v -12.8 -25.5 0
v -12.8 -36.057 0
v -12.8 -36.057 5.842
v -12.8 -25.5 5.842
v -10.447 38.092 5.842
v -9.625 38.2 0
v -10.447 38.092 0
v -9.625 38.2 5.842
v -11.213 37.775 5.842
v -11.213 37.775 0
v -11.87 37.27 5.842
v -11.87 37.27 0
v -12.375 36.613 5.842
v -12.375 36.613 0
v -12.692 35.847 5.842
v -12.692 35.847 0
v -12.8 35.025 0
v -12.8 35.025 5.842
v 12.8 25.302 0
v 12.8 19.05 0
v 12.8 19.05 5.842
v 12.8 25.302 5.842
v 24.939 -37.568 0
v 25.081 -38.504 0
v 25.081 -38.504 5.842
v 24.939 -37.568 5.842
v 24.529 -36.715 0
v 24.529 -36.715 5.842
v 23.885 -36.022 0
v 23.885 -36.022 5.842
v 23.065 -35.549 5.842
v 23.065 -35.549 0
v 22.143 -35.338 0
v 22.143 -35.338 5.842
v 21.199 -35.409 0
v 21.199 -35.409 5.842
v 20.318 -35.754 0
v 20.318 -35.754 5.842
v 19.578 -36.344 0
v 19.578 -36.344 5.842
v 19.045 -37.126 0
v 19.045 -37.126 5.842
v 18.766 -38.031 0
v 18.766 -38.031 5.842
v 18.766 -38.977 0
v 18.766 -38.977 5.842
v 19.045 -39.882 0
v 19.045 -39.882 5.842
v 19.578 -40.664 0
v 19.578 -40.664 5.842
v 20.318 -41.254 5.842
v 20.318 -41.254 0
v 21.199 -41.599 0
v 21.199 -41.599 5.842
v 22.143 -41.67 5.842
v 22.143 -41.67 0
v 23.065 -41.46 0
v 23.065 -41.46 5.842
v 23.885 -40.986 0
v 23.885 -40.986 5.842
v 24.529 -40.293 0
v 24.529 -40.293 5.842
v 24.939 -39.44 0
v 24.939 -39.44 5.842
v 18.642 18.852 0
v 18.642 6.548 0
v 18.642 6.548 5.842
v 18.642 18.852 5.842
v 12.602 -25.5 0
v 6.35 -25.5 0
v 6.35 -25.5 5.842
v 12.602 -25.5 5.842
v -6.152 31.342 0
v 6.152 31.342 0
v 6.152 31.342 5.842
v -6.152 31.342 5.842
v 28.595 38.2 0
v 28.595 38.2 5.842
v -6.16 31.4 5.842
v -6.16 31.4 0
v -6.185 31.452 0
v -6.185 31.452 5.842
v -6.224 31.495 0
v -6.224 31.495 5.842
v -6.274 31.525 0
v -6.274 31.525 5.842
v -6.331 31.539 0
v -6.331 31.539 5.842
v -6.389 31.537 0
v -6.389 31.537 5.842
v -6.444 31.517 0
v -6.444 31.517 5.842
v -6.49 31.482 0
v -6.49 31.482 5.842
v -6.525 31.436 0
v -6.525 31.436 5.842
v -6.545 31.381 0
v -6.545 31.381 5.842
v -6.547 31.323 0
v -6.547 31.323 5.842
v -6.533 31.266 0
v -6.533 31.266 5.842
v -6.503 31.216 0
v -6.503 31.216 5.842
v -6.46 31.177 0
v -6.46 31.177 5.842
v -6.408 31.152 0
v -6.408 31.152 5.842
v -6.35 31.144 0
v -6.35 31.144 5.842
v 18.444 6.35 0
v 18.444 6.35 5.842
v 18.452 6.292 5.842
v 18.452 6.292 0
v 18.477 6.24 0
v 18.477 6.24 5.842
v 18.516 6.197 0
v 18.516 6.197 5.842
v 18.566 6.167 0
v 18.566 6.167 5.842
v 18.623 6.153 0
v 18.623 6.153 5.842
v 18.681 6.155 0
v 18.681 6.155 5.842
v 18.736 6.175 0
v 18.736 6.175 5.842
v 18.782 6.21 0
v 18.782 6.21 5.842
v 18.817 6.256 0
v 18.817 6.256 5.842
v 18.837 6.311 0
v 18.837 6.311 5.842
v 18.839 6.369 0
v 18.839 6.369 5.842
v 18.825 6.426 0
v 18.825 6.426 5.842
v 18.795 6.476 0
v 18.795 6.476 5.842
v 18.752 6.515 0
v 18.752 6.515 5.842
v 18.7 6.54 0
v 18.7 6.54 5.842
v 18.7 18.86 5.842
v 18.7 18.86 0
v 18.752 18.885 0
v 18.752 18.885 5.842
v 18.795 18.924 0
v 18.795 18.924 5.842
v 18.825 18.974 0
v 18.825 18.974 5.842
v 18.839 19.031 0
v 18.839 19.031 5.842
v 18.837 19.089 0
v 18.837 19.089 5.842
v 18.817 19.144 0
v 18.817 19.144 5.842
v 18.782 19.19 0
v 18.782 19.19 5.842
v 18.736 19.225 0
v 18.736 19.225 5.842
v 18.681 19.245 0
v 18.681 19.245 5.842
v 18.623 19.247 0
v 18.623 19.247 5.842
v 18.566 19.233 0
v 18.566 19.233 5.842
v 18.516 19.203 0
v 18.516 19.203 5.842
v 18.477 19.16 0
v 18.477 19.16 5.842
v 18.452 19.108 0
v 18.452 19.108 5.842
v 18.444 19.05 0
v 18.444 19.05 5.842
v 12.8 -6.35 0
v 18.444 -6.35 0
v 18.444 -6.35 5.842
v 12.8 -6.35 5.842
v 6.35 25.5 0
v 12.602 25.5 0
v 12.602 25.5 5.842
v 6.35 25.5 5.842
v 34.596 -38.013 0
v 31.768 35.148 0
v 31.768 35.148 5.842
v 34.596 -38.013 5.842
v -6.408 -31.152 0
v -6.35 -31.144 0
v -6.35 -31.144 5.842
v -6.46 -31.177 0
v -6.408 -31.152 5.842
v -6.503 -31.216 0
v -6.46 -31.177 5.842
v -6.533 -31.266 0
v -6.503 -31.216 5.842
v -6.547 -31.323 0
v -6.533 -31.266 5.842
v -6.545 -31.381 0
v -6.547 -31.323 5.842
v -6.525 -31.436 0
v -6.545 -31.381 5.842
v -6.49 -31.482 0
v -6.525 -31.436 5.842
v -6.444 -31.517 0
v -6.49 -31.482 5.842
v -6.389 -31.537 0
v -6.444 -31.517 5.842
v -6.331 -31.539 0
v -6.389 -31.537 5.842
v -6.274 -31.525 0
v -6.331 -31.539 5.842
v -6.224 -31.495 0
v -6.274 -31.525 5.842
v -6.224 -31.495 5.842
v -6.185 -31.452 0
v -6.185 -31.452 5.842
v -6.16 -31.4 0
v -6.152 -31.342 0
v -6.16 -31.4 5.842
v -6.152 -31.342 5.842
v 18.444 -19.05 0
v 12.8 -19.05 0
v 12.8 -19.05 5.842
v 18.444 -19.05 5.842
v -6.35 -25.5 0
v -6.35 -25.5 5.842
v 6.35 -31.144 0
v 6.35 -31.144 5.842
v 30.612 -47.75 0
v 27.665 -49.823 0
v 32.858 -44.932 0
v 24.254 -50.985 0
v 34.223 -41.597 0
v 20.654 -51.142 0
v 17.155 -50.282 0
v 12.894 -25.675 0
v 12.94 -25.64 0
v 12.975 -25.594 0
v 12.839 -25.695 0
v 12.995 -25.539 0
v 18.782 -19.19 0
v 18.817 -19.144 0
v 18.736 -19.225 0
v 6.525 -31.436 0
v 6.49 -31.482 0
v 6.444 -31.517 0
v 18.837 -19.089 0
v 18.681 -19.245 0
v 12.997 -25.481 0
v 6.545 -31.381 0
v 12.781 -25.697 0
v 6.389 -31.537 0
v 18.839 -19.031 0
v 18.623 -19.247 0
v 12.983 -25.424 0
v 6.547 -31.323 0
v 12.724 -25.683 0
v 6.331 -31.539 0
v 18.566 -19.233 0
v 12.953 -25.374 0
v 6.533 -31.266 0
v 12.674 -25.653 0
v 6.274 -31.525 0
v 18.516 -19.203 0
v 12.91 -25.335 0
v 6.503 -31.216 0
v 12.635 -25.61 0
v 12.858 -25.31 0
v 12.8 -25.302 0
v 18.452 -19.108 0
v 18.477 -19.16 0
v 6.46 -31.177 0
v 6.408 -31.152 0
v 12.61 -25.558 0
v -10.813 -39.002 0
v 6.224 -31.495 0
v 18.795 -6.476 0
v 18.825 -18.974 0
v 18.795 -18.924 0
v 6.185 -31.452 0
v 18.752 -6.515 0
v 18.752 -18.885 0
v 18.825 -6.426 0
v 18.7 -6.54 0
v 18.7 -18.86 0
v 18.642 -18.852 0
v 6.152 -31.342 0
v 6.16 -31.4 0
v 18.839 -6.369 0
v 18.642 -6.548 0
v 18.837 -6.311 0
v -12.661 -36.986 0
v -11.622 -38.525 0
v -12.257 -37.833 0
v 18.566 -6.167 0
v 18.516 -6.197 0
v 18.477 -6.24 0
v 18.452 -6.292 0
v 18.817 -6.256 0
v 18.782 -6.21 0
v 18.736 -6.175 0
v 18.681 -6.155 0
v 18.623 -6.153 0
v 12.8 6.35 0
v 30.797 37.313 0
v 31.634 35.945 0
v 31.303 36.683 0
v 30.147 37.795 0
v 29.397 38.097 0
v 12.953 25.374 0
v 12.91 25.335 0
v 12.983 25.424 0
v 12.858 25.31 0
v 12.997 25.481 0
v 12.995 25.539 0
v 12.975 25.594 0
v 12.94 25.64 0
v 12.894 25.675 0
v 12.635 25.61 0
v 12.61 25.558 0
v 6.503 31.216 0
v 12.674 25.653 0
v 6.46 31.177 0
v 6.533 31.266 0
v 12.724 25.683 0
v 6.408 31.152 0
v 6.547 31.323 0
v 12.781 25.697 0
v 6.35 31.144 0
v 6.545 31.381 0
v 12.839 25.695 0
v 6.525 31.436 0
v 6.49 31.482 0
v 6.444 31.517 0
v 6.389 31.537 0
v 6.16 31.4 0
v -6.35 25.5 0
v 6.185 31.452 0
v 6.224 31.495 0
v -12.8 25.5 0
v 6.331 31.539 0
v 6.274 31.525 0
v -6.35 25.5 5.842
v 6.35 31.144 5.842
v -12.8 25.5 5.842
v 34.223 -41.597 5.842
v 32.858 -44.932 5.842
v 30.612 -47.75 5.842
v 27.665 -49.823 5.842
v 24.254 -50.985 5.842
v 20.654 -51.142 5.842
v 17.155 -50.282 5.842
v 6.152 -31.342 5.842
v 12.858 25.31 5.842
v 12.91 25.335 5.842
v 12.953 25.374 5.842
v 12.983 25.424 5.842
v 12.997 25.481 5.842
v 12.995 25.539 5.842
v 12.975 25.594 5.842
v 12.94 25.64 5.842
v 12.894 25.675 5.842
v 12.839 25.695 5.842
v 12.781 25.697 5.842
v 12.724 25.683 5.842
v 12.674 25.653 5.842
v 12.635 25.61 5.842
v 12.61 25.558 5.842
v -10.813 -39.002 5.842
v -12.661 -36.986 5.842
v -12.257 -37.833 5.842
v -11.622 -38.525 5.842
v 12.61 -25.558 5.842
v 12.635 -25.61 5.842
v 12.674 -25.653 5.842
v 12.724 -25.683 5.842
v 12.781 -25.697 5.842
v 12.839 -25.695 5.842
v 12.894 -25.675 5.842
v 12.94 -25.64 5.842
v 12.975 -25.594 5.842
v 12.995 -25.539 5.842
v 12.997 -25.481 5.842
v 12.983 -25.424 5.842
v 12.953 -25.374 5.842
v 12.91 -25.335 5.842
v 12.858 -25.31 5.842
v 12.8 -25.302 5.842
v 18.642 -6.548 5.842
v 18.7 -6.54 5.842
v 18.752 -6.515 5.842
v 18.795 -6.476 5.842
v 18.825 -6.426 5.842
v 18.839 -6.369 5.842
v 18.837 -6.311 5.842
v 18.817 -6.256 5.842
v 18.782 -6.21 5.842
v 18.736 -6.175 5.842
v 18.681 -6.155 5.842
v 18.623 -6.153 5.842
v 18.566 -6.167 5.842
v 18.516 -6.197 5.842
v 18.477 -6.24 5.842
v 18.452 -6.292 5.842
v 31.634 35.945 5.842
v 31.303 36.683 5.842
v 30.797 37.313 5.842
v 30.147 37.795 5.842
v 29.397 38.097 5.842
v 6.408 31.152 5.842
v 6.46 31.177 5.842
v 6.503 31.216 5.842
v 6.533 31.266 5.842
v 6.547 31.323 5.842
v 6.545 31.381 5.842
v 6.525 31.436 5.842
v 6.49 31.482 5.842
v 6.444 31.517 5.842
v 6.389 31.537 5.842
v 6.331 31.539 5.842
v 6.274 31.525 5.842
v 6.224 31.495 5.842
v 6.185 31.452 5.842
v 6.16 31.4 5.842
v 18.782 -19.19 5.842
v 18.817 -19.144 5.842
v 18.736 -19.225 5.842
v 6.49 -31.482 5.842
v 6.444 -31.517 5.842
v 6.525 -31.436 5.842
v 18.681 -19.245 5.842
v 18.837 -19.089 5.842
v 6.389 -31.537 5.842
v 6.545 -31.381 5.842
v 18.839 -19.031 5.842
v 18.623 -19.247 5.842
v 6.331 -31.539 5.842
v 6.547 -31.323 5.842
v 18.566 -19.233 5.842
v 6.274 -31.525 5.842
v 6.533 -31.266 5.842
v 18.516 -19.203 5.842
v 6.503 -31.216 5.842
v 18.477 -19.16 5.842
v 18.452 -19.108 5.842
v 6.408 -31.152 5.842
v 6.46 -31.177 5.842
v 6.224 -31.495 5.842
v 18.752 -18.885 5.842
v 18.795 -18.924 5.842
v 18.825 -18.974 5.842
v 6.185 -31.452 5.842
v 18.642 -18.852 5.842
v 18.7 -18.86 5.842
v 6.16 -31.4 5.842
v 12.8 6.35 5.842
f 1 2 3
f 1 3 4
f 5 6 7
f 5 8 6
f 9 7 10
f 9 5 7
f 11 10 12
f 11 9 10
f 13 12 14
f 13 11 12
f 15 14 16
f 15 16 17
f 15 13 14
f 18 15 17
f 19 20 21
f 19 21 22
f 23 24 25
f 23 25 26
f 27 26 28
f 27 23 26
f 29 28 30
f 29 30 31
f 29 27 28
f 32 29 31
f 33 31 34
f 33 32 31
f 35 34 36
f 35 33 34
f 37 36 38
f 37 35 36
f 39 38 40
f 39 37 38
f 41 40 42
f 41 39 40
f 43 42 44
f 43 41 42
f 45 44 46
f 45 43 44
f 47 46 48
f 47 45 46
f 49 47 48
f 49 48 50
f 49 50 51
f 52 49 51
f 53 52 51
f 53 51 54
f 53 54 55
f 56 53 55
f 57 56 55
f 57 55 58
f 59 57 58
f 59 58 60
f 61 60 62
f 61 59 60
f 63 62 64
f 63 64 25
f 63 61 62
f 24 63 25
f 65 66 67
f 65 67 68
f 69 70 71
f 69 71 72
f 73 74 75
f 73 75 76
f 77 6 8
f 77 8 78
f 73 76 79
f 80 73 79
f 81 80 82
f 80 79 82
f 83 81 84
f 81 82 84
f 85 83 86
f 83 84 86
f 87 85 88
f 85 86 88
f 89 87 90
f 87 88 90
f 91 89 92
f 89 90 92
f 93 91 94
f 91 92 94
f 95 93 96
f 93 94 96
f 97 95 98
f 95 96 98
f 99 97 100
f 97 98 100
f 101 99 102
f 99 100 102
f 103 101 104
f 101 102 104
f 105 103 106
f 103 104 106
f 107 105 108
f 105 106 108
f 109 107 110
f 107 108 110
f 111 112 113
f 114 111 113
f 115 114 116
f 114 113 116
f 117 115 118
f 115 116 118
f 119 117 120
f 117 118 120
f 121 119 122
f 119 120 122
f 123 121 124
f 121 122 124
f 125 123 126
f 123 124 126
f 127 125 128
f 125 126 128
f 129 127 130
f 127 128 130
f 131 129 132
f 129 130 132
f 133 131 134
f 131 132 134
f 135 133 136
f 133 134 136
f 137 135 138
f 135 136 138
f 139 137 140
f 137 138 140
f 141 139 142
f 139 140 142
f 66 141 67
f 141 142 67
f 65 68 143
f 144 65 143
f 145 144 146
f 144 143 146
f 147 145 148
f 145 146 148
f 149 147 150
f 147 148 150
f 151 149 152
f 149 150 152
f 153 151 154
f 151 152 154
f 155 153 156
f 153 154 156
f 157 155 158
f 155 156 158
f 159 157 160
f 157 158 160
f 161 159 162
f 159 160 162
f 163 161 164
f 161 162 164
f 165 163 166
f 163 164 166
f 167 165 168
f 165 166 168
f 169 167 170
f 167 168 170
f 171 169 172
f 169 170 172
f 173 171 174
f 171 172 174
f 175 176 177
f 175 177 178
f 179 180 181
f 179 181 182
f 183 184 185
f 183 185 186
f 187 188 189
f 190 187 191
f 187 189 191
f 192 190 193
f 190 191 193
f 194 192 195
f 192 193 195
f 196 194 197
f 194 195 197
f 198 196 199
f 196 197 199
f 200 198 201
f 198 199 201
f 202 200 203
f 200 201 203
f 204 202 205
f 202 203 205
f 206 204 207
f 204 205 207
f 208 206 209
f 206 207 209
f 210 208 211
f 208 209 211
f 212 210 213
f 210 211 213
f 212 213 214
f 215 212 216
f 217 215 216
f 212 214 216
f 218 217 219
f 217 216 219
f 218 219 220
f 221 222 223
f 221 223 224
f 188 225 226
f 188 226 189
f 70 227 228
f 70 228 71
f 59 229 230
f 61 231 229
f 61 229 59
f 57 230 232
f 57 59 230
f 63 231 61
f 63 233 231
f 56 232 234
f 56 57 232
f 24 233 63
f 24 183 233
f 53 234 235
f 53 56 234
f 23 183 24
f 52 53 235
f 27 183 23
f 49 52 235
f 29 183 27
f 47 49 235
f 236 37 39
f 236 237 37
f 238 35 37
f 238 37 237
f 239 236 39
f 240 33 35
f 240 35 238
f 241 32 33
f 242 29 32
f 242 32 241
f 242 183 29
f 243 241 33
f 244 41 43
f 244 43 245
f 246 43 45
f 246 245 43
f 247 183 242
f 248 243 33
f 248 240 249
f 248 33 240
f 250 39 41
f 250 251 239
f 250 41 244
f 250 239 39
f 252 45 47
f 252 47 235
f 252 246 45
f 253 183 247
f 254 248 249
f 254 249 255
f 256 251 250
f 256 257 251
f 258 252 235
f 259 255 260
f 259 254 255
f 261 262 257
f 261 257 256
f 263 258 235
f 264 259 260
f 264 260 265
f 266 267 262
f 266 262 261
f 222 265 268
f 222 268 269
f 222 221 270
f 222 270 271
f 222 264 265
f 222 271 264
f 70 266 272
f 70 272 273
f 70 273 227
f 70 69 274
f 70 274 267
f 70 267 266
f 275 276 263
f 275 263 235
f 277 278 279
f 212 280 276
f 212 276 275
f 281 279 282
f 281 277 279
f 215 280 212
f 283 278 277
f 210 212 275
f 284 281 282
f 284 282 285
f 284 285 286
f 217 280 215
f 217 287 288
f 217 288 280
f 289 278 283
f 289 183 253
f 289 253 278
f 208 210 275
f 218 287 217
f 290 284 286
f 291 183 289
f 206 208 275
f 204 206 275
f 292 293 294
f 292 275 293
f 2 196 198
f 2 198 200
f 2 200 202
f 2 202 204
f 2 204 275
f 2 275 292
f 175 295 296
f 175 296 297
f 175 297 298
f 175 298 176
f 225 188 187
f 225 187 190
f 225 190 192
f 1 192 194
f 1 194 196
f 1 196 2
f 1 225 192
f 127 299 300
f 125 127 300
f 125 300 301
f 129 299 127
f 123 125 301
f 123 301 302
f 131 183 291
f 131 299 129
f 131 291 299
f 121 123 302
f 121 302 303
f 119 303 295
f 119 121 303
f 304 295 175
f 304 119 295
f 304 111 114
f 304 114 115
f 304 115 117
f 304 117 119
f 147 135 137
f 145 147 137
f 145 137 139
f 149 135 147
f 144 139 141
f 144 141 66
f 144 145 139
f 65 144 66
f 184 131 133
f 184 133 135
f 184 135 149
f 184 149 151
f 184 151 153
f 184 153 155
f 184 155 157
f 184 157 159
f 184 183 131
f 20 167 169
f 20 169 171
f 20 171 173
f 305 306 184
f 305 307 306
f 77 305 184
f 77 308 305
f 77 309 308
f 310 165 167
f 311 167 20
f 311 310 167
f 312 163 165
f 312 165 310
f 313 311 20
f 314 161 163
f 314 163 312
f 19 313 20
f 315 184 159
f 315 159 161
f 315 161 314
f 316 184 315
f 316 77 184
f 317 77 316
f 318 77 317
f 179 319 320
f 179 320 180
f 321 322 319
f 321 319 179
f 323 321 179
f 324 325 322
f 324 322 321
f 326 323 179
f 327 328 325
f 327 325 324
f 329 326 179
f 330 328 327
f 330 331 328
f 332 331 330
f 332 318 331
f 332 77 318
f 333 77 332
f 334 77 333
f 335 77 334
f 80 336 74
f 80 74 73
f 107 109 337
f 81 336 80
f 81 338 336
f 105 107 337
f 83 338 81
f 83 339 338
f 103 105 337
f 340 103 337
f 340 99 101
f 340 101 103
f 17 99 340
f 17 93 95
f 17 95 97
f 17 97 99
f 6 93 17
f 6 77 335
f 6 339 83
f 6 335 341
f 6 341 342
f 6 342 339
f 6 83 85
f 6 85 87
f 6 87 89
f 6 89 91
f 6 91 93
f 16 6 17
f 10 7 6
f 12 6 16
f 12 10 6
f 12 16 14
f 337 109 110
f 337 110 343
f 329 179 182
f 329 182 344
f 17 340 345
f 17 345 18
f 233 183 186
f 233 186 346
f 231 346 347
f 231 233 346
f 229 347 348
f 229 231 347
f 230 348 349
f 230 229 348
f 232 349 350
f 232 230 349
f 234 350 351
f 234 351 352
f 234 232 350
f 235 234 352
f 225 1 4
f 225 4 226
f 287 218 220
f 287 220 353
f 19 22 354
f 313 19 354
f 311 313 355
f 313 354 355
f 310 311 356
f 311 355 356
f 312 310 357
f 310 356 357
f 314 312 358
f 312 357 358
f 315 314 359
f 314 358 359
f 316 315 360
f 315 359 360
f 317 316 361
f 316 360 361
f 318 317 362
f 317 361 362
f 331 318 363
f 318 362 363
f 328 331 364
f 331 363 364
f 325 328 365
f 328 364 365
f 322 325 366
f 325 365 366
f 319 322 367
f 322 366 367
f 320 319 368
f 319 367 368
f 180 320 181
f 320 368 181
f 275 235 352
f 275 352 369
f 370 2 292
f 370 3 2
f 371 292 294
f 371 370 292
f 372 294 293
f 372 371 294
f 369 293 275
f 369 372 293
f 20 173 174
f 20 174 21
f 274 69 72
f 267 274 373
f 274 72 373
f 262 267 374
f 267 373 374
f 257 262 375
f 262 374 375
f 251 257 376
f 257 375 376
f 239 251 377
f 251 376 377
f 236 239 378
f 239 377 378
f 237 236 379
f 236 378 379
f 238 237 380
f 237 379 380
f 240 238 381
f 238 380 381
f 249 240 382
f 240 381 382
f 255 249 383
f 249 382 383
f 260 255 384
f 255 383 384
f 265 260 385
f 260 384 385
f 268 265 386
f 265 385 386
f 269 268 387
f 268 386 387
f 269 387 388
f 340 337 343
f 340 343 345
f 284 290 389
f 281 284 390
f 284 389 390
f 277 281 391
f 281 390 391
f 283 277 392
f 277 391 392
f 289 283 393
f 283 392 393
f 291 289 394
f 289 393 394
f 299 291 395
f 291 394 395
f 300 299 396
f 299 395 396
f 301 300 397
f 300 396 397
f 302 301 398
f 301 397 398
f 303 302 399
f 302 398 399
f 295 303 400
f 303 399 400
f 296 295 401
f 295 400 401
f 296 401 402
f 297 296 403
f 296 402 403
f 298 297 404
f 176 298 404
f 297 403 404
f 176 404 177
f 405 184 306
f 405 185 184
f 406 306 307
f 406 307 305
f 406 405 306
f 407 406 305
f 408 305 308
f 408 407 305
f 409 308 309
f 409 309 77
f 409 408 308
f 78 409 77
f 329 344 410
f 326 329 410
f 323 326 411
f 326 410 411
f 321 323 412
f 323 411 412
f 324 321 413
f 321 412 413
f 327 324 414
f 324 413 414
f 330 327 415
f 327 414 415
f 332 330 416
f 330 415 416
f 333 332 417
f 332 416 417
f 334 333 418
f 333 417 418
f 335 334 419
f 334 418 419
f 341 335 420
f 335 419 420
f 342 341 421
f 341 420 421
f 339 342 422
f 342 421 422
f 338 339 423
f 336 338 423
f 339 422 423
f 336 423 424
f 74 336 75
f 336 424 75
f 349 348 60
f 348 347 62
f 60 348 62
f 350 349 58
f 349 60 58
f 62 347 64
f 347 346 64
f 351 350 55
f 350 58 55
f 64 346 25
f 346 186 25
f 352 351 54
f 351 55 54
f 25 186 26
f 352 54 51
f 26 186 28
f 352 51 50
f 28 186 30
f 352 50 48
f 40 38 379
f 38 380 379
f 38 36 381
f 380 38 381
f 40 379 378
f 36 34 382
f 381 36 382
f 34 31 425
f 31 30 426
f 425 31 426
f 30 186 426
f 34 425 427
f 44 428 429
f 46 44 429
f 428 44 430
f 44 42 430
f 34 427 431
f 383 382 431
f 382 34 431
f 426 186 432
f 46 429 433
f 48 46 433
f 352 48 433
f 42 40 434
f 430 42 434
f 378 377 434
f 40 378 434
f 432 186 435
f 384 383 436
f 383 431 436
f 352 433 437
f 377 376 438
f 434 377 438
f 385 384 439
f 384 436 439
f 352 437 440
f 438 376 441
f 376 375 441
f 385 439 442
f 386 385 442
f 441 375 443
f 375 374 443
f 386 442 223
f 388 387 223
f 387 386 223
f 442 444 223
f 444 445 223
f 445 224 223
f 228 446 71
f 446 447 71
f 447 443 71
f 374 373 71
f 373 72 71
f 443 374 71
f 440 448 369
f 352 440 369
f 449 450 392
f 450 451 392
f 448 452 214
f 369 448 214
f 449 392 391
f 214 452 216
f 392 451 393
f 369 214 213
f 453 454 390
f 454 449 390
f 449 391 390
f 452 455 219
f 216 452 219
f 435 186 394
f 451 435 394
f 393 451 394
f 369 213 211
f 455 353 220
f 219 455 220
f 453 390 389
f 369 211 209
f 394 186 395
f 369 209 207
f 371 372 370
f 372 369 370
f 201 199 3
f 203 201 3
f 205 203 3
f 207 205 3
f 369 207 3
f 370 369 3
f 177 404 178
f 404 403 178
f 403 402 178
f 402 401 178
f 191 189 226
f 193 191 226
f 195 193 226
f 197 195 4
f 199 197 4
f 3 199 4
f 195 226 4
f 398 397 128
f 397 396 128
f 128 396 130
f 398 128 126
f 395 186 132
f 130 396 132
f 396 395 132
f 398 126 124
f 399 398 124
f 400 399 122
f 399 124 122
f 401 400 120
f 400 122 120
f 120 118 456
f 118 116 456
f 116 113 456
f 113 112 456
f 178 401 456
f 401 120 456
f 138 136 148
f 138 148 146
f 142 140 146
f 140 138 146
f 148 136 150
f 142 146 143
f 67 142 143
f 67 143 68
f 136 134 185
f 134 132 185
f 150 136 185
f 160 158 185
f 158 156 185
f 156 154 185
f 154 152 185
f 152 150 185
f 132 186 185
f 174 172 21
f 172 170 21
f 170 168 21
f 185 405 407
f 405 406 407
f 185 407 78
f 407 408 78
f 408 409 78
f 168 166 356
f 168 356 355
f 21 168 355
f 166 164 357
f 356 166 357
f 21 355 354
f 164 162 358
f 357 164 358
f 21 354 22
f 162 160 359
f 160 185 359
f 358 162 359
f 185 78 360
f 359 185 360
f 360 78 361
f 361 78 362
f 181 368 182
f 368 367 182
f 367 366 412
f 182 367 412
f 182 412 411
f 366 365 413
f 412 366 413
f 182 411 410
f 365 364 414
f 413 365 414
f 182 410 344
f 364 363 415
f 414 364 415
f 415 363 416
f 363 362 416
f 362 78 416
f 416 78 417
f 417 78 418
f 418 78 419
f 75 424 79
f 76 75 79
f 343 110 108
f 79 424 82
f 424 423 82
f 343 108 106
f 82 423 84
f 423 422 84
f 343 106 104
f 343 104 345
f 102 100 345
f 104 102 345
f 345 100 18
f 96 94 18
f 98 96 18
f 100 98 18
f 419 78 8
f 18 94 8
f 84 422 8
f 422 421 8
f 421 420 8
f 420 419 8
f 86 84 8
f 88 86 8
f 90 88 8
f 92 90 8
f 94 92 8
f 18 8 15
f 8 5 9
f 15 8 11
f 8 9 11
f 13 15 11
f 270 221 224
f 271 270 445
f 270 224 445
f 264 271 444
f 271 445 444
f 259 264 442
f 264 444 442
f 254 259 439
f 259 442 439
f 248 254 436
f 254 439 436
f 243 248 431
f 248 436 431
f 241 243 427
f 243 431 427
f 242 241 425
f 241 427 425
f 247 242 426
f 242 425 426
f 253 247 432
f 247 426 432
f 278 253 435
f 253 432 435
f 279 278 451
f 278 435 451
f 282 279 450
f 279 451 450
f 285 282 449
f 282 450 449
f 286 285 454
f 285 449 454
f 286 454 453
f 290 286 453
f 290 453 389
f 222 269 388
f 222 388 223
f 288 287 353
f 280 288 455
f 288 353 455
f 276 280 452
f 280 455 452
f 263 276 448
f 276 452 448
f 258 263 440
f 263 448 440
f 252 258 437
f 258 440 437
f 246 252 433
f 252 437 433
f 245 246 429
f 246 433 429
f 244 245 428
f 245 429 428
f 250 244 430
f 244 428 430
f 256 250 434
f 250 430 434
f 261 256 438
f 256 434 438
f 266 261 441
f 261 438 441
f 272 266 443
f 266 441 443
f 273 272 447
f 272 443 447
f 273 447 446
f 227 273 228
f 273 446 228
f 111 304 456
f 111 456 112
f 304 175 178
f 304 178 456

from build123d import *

# Parameters (mm, degrees)
SKETCH1_R           = 3.175
BOSS_EXTRUDE1_DEPTH = 5.842
FILLET2_R           = 3.175
SKETCH2_R           = 0.1984375
CUT_EXTRUDE1_DEPTH  = 63.076766734


with BuildPart() as part:
    # Sketch1 → Boss-Extrude1 (new body)
    with BuildSketch(Plane.XY):
        with BuildLine():
            Line((-12.8, -25.5), (-6.35, -25.5))
            Line((-6.35, -25.5), (-6.35, -31.342))
            Line((-6.35, -31.342), (6.35, -31.342))
            Line((6.35, -31.342), (6.35, -25.5))
            Line((6.35, -25.5), (12.8, -25.5))
            Line((12.8, -25.5), (12.8, -19.05))
            Line((12.8, -19.05), (18.642, -19.05))
            Line((18.642, -19.05), (18.642, -6.35))
            Line((18.642, -6.35), (12.8, -6.35))
            Line((12.8, -6.35), (12.8, 6.35))
            Line((12.8, 6.35), (18.642, 6.35))
            Line((18.642, 6.35), (18.642, 19.05))
            Line((18.642, 19.05), (12.8, 19.05))
            Line((12.8, 19.05), (12.8, 25.5))
            Line((12.8, 25.5), (6.35, 25.5))
            Line((6.35, 25.5), (6.35, 31.342))
            Line((6.35, 31.342), (-6.35, 31.342))
            Line((-6.35, 31.342), (-6.35, 25.5))
            Line((-6.35, 25.5), (-12.8, 25.5))
            Line((-12.8, 25.5), (-12.8, 38.2))
            Line((-12.8, 38.2), (31.65, 38.2))
            Line((31.65, 38.2), (34.596048217, -38.0134839))
            ThreePointArc((34.596048217, -38.0134839), (29.212391738, -48.89151732), (17.154957424, -50.282073297))
            Line((17.154957424, -50.282073297), (-12.8, -38.2))
            Line((-12.8, -38.2), (-12.8, -25.5))
        make_face()
        with Locations((21.905525927, -38.504038703)):
            Circle(SKETCH1_R, mode=Mode.SUBTRACT)
    extrude(amount=BOSS_EXTRUDE1_DEPTH)

    # Fillet2
    fillet2_edges = [part.edges().sort_by_distance(p)[0] for p in [
        (-12.8, 38.2, 2.921),
        (31.65, 38.2, 2.921),
        (-12.8, -38.2, 2.921),
    ]]
    fillet(fillet2_edges, radius=FILLET2_R)

    # Sketch2 → Cut-Extrude1 (cut, through all)
    with BuildSketch(Plane.XY.offset(5.842)):
        with Locations((-6.35, 31.342)):
            Circle(SKETCH2_R)
        with Locations((6.35, 31.342)):
            Circle(SKETCH2_R)
        with Locations((12.8, 25.5)):
            Circle(SKETCH2_R)
        with Locations((18.642, 6.35)):
            Circle(SKETCH2_R)
        with Locations((18.642, 19.05)):
            Circle(SKETCH2_R)
        with Locations((18.642, -19.05)):
            Circle(SKETCH2_R)
        with Locations((18.642, -6.35)):
            Circle(SKETCH2_R)
        with Locations((12.8, -25.5)):
            Circle(SKETCH2_R)
        with Locations((6.35, -31.342)):
            Circle(SKETCH2_R)
        with Locations((-6.35, -31.342)):
            Circle(SKETCH2_R)
    extrude(amount=-CUT_EXTRUDE1_DEPTH, mode=Mode.SUBTRACT)


solid = part.part
